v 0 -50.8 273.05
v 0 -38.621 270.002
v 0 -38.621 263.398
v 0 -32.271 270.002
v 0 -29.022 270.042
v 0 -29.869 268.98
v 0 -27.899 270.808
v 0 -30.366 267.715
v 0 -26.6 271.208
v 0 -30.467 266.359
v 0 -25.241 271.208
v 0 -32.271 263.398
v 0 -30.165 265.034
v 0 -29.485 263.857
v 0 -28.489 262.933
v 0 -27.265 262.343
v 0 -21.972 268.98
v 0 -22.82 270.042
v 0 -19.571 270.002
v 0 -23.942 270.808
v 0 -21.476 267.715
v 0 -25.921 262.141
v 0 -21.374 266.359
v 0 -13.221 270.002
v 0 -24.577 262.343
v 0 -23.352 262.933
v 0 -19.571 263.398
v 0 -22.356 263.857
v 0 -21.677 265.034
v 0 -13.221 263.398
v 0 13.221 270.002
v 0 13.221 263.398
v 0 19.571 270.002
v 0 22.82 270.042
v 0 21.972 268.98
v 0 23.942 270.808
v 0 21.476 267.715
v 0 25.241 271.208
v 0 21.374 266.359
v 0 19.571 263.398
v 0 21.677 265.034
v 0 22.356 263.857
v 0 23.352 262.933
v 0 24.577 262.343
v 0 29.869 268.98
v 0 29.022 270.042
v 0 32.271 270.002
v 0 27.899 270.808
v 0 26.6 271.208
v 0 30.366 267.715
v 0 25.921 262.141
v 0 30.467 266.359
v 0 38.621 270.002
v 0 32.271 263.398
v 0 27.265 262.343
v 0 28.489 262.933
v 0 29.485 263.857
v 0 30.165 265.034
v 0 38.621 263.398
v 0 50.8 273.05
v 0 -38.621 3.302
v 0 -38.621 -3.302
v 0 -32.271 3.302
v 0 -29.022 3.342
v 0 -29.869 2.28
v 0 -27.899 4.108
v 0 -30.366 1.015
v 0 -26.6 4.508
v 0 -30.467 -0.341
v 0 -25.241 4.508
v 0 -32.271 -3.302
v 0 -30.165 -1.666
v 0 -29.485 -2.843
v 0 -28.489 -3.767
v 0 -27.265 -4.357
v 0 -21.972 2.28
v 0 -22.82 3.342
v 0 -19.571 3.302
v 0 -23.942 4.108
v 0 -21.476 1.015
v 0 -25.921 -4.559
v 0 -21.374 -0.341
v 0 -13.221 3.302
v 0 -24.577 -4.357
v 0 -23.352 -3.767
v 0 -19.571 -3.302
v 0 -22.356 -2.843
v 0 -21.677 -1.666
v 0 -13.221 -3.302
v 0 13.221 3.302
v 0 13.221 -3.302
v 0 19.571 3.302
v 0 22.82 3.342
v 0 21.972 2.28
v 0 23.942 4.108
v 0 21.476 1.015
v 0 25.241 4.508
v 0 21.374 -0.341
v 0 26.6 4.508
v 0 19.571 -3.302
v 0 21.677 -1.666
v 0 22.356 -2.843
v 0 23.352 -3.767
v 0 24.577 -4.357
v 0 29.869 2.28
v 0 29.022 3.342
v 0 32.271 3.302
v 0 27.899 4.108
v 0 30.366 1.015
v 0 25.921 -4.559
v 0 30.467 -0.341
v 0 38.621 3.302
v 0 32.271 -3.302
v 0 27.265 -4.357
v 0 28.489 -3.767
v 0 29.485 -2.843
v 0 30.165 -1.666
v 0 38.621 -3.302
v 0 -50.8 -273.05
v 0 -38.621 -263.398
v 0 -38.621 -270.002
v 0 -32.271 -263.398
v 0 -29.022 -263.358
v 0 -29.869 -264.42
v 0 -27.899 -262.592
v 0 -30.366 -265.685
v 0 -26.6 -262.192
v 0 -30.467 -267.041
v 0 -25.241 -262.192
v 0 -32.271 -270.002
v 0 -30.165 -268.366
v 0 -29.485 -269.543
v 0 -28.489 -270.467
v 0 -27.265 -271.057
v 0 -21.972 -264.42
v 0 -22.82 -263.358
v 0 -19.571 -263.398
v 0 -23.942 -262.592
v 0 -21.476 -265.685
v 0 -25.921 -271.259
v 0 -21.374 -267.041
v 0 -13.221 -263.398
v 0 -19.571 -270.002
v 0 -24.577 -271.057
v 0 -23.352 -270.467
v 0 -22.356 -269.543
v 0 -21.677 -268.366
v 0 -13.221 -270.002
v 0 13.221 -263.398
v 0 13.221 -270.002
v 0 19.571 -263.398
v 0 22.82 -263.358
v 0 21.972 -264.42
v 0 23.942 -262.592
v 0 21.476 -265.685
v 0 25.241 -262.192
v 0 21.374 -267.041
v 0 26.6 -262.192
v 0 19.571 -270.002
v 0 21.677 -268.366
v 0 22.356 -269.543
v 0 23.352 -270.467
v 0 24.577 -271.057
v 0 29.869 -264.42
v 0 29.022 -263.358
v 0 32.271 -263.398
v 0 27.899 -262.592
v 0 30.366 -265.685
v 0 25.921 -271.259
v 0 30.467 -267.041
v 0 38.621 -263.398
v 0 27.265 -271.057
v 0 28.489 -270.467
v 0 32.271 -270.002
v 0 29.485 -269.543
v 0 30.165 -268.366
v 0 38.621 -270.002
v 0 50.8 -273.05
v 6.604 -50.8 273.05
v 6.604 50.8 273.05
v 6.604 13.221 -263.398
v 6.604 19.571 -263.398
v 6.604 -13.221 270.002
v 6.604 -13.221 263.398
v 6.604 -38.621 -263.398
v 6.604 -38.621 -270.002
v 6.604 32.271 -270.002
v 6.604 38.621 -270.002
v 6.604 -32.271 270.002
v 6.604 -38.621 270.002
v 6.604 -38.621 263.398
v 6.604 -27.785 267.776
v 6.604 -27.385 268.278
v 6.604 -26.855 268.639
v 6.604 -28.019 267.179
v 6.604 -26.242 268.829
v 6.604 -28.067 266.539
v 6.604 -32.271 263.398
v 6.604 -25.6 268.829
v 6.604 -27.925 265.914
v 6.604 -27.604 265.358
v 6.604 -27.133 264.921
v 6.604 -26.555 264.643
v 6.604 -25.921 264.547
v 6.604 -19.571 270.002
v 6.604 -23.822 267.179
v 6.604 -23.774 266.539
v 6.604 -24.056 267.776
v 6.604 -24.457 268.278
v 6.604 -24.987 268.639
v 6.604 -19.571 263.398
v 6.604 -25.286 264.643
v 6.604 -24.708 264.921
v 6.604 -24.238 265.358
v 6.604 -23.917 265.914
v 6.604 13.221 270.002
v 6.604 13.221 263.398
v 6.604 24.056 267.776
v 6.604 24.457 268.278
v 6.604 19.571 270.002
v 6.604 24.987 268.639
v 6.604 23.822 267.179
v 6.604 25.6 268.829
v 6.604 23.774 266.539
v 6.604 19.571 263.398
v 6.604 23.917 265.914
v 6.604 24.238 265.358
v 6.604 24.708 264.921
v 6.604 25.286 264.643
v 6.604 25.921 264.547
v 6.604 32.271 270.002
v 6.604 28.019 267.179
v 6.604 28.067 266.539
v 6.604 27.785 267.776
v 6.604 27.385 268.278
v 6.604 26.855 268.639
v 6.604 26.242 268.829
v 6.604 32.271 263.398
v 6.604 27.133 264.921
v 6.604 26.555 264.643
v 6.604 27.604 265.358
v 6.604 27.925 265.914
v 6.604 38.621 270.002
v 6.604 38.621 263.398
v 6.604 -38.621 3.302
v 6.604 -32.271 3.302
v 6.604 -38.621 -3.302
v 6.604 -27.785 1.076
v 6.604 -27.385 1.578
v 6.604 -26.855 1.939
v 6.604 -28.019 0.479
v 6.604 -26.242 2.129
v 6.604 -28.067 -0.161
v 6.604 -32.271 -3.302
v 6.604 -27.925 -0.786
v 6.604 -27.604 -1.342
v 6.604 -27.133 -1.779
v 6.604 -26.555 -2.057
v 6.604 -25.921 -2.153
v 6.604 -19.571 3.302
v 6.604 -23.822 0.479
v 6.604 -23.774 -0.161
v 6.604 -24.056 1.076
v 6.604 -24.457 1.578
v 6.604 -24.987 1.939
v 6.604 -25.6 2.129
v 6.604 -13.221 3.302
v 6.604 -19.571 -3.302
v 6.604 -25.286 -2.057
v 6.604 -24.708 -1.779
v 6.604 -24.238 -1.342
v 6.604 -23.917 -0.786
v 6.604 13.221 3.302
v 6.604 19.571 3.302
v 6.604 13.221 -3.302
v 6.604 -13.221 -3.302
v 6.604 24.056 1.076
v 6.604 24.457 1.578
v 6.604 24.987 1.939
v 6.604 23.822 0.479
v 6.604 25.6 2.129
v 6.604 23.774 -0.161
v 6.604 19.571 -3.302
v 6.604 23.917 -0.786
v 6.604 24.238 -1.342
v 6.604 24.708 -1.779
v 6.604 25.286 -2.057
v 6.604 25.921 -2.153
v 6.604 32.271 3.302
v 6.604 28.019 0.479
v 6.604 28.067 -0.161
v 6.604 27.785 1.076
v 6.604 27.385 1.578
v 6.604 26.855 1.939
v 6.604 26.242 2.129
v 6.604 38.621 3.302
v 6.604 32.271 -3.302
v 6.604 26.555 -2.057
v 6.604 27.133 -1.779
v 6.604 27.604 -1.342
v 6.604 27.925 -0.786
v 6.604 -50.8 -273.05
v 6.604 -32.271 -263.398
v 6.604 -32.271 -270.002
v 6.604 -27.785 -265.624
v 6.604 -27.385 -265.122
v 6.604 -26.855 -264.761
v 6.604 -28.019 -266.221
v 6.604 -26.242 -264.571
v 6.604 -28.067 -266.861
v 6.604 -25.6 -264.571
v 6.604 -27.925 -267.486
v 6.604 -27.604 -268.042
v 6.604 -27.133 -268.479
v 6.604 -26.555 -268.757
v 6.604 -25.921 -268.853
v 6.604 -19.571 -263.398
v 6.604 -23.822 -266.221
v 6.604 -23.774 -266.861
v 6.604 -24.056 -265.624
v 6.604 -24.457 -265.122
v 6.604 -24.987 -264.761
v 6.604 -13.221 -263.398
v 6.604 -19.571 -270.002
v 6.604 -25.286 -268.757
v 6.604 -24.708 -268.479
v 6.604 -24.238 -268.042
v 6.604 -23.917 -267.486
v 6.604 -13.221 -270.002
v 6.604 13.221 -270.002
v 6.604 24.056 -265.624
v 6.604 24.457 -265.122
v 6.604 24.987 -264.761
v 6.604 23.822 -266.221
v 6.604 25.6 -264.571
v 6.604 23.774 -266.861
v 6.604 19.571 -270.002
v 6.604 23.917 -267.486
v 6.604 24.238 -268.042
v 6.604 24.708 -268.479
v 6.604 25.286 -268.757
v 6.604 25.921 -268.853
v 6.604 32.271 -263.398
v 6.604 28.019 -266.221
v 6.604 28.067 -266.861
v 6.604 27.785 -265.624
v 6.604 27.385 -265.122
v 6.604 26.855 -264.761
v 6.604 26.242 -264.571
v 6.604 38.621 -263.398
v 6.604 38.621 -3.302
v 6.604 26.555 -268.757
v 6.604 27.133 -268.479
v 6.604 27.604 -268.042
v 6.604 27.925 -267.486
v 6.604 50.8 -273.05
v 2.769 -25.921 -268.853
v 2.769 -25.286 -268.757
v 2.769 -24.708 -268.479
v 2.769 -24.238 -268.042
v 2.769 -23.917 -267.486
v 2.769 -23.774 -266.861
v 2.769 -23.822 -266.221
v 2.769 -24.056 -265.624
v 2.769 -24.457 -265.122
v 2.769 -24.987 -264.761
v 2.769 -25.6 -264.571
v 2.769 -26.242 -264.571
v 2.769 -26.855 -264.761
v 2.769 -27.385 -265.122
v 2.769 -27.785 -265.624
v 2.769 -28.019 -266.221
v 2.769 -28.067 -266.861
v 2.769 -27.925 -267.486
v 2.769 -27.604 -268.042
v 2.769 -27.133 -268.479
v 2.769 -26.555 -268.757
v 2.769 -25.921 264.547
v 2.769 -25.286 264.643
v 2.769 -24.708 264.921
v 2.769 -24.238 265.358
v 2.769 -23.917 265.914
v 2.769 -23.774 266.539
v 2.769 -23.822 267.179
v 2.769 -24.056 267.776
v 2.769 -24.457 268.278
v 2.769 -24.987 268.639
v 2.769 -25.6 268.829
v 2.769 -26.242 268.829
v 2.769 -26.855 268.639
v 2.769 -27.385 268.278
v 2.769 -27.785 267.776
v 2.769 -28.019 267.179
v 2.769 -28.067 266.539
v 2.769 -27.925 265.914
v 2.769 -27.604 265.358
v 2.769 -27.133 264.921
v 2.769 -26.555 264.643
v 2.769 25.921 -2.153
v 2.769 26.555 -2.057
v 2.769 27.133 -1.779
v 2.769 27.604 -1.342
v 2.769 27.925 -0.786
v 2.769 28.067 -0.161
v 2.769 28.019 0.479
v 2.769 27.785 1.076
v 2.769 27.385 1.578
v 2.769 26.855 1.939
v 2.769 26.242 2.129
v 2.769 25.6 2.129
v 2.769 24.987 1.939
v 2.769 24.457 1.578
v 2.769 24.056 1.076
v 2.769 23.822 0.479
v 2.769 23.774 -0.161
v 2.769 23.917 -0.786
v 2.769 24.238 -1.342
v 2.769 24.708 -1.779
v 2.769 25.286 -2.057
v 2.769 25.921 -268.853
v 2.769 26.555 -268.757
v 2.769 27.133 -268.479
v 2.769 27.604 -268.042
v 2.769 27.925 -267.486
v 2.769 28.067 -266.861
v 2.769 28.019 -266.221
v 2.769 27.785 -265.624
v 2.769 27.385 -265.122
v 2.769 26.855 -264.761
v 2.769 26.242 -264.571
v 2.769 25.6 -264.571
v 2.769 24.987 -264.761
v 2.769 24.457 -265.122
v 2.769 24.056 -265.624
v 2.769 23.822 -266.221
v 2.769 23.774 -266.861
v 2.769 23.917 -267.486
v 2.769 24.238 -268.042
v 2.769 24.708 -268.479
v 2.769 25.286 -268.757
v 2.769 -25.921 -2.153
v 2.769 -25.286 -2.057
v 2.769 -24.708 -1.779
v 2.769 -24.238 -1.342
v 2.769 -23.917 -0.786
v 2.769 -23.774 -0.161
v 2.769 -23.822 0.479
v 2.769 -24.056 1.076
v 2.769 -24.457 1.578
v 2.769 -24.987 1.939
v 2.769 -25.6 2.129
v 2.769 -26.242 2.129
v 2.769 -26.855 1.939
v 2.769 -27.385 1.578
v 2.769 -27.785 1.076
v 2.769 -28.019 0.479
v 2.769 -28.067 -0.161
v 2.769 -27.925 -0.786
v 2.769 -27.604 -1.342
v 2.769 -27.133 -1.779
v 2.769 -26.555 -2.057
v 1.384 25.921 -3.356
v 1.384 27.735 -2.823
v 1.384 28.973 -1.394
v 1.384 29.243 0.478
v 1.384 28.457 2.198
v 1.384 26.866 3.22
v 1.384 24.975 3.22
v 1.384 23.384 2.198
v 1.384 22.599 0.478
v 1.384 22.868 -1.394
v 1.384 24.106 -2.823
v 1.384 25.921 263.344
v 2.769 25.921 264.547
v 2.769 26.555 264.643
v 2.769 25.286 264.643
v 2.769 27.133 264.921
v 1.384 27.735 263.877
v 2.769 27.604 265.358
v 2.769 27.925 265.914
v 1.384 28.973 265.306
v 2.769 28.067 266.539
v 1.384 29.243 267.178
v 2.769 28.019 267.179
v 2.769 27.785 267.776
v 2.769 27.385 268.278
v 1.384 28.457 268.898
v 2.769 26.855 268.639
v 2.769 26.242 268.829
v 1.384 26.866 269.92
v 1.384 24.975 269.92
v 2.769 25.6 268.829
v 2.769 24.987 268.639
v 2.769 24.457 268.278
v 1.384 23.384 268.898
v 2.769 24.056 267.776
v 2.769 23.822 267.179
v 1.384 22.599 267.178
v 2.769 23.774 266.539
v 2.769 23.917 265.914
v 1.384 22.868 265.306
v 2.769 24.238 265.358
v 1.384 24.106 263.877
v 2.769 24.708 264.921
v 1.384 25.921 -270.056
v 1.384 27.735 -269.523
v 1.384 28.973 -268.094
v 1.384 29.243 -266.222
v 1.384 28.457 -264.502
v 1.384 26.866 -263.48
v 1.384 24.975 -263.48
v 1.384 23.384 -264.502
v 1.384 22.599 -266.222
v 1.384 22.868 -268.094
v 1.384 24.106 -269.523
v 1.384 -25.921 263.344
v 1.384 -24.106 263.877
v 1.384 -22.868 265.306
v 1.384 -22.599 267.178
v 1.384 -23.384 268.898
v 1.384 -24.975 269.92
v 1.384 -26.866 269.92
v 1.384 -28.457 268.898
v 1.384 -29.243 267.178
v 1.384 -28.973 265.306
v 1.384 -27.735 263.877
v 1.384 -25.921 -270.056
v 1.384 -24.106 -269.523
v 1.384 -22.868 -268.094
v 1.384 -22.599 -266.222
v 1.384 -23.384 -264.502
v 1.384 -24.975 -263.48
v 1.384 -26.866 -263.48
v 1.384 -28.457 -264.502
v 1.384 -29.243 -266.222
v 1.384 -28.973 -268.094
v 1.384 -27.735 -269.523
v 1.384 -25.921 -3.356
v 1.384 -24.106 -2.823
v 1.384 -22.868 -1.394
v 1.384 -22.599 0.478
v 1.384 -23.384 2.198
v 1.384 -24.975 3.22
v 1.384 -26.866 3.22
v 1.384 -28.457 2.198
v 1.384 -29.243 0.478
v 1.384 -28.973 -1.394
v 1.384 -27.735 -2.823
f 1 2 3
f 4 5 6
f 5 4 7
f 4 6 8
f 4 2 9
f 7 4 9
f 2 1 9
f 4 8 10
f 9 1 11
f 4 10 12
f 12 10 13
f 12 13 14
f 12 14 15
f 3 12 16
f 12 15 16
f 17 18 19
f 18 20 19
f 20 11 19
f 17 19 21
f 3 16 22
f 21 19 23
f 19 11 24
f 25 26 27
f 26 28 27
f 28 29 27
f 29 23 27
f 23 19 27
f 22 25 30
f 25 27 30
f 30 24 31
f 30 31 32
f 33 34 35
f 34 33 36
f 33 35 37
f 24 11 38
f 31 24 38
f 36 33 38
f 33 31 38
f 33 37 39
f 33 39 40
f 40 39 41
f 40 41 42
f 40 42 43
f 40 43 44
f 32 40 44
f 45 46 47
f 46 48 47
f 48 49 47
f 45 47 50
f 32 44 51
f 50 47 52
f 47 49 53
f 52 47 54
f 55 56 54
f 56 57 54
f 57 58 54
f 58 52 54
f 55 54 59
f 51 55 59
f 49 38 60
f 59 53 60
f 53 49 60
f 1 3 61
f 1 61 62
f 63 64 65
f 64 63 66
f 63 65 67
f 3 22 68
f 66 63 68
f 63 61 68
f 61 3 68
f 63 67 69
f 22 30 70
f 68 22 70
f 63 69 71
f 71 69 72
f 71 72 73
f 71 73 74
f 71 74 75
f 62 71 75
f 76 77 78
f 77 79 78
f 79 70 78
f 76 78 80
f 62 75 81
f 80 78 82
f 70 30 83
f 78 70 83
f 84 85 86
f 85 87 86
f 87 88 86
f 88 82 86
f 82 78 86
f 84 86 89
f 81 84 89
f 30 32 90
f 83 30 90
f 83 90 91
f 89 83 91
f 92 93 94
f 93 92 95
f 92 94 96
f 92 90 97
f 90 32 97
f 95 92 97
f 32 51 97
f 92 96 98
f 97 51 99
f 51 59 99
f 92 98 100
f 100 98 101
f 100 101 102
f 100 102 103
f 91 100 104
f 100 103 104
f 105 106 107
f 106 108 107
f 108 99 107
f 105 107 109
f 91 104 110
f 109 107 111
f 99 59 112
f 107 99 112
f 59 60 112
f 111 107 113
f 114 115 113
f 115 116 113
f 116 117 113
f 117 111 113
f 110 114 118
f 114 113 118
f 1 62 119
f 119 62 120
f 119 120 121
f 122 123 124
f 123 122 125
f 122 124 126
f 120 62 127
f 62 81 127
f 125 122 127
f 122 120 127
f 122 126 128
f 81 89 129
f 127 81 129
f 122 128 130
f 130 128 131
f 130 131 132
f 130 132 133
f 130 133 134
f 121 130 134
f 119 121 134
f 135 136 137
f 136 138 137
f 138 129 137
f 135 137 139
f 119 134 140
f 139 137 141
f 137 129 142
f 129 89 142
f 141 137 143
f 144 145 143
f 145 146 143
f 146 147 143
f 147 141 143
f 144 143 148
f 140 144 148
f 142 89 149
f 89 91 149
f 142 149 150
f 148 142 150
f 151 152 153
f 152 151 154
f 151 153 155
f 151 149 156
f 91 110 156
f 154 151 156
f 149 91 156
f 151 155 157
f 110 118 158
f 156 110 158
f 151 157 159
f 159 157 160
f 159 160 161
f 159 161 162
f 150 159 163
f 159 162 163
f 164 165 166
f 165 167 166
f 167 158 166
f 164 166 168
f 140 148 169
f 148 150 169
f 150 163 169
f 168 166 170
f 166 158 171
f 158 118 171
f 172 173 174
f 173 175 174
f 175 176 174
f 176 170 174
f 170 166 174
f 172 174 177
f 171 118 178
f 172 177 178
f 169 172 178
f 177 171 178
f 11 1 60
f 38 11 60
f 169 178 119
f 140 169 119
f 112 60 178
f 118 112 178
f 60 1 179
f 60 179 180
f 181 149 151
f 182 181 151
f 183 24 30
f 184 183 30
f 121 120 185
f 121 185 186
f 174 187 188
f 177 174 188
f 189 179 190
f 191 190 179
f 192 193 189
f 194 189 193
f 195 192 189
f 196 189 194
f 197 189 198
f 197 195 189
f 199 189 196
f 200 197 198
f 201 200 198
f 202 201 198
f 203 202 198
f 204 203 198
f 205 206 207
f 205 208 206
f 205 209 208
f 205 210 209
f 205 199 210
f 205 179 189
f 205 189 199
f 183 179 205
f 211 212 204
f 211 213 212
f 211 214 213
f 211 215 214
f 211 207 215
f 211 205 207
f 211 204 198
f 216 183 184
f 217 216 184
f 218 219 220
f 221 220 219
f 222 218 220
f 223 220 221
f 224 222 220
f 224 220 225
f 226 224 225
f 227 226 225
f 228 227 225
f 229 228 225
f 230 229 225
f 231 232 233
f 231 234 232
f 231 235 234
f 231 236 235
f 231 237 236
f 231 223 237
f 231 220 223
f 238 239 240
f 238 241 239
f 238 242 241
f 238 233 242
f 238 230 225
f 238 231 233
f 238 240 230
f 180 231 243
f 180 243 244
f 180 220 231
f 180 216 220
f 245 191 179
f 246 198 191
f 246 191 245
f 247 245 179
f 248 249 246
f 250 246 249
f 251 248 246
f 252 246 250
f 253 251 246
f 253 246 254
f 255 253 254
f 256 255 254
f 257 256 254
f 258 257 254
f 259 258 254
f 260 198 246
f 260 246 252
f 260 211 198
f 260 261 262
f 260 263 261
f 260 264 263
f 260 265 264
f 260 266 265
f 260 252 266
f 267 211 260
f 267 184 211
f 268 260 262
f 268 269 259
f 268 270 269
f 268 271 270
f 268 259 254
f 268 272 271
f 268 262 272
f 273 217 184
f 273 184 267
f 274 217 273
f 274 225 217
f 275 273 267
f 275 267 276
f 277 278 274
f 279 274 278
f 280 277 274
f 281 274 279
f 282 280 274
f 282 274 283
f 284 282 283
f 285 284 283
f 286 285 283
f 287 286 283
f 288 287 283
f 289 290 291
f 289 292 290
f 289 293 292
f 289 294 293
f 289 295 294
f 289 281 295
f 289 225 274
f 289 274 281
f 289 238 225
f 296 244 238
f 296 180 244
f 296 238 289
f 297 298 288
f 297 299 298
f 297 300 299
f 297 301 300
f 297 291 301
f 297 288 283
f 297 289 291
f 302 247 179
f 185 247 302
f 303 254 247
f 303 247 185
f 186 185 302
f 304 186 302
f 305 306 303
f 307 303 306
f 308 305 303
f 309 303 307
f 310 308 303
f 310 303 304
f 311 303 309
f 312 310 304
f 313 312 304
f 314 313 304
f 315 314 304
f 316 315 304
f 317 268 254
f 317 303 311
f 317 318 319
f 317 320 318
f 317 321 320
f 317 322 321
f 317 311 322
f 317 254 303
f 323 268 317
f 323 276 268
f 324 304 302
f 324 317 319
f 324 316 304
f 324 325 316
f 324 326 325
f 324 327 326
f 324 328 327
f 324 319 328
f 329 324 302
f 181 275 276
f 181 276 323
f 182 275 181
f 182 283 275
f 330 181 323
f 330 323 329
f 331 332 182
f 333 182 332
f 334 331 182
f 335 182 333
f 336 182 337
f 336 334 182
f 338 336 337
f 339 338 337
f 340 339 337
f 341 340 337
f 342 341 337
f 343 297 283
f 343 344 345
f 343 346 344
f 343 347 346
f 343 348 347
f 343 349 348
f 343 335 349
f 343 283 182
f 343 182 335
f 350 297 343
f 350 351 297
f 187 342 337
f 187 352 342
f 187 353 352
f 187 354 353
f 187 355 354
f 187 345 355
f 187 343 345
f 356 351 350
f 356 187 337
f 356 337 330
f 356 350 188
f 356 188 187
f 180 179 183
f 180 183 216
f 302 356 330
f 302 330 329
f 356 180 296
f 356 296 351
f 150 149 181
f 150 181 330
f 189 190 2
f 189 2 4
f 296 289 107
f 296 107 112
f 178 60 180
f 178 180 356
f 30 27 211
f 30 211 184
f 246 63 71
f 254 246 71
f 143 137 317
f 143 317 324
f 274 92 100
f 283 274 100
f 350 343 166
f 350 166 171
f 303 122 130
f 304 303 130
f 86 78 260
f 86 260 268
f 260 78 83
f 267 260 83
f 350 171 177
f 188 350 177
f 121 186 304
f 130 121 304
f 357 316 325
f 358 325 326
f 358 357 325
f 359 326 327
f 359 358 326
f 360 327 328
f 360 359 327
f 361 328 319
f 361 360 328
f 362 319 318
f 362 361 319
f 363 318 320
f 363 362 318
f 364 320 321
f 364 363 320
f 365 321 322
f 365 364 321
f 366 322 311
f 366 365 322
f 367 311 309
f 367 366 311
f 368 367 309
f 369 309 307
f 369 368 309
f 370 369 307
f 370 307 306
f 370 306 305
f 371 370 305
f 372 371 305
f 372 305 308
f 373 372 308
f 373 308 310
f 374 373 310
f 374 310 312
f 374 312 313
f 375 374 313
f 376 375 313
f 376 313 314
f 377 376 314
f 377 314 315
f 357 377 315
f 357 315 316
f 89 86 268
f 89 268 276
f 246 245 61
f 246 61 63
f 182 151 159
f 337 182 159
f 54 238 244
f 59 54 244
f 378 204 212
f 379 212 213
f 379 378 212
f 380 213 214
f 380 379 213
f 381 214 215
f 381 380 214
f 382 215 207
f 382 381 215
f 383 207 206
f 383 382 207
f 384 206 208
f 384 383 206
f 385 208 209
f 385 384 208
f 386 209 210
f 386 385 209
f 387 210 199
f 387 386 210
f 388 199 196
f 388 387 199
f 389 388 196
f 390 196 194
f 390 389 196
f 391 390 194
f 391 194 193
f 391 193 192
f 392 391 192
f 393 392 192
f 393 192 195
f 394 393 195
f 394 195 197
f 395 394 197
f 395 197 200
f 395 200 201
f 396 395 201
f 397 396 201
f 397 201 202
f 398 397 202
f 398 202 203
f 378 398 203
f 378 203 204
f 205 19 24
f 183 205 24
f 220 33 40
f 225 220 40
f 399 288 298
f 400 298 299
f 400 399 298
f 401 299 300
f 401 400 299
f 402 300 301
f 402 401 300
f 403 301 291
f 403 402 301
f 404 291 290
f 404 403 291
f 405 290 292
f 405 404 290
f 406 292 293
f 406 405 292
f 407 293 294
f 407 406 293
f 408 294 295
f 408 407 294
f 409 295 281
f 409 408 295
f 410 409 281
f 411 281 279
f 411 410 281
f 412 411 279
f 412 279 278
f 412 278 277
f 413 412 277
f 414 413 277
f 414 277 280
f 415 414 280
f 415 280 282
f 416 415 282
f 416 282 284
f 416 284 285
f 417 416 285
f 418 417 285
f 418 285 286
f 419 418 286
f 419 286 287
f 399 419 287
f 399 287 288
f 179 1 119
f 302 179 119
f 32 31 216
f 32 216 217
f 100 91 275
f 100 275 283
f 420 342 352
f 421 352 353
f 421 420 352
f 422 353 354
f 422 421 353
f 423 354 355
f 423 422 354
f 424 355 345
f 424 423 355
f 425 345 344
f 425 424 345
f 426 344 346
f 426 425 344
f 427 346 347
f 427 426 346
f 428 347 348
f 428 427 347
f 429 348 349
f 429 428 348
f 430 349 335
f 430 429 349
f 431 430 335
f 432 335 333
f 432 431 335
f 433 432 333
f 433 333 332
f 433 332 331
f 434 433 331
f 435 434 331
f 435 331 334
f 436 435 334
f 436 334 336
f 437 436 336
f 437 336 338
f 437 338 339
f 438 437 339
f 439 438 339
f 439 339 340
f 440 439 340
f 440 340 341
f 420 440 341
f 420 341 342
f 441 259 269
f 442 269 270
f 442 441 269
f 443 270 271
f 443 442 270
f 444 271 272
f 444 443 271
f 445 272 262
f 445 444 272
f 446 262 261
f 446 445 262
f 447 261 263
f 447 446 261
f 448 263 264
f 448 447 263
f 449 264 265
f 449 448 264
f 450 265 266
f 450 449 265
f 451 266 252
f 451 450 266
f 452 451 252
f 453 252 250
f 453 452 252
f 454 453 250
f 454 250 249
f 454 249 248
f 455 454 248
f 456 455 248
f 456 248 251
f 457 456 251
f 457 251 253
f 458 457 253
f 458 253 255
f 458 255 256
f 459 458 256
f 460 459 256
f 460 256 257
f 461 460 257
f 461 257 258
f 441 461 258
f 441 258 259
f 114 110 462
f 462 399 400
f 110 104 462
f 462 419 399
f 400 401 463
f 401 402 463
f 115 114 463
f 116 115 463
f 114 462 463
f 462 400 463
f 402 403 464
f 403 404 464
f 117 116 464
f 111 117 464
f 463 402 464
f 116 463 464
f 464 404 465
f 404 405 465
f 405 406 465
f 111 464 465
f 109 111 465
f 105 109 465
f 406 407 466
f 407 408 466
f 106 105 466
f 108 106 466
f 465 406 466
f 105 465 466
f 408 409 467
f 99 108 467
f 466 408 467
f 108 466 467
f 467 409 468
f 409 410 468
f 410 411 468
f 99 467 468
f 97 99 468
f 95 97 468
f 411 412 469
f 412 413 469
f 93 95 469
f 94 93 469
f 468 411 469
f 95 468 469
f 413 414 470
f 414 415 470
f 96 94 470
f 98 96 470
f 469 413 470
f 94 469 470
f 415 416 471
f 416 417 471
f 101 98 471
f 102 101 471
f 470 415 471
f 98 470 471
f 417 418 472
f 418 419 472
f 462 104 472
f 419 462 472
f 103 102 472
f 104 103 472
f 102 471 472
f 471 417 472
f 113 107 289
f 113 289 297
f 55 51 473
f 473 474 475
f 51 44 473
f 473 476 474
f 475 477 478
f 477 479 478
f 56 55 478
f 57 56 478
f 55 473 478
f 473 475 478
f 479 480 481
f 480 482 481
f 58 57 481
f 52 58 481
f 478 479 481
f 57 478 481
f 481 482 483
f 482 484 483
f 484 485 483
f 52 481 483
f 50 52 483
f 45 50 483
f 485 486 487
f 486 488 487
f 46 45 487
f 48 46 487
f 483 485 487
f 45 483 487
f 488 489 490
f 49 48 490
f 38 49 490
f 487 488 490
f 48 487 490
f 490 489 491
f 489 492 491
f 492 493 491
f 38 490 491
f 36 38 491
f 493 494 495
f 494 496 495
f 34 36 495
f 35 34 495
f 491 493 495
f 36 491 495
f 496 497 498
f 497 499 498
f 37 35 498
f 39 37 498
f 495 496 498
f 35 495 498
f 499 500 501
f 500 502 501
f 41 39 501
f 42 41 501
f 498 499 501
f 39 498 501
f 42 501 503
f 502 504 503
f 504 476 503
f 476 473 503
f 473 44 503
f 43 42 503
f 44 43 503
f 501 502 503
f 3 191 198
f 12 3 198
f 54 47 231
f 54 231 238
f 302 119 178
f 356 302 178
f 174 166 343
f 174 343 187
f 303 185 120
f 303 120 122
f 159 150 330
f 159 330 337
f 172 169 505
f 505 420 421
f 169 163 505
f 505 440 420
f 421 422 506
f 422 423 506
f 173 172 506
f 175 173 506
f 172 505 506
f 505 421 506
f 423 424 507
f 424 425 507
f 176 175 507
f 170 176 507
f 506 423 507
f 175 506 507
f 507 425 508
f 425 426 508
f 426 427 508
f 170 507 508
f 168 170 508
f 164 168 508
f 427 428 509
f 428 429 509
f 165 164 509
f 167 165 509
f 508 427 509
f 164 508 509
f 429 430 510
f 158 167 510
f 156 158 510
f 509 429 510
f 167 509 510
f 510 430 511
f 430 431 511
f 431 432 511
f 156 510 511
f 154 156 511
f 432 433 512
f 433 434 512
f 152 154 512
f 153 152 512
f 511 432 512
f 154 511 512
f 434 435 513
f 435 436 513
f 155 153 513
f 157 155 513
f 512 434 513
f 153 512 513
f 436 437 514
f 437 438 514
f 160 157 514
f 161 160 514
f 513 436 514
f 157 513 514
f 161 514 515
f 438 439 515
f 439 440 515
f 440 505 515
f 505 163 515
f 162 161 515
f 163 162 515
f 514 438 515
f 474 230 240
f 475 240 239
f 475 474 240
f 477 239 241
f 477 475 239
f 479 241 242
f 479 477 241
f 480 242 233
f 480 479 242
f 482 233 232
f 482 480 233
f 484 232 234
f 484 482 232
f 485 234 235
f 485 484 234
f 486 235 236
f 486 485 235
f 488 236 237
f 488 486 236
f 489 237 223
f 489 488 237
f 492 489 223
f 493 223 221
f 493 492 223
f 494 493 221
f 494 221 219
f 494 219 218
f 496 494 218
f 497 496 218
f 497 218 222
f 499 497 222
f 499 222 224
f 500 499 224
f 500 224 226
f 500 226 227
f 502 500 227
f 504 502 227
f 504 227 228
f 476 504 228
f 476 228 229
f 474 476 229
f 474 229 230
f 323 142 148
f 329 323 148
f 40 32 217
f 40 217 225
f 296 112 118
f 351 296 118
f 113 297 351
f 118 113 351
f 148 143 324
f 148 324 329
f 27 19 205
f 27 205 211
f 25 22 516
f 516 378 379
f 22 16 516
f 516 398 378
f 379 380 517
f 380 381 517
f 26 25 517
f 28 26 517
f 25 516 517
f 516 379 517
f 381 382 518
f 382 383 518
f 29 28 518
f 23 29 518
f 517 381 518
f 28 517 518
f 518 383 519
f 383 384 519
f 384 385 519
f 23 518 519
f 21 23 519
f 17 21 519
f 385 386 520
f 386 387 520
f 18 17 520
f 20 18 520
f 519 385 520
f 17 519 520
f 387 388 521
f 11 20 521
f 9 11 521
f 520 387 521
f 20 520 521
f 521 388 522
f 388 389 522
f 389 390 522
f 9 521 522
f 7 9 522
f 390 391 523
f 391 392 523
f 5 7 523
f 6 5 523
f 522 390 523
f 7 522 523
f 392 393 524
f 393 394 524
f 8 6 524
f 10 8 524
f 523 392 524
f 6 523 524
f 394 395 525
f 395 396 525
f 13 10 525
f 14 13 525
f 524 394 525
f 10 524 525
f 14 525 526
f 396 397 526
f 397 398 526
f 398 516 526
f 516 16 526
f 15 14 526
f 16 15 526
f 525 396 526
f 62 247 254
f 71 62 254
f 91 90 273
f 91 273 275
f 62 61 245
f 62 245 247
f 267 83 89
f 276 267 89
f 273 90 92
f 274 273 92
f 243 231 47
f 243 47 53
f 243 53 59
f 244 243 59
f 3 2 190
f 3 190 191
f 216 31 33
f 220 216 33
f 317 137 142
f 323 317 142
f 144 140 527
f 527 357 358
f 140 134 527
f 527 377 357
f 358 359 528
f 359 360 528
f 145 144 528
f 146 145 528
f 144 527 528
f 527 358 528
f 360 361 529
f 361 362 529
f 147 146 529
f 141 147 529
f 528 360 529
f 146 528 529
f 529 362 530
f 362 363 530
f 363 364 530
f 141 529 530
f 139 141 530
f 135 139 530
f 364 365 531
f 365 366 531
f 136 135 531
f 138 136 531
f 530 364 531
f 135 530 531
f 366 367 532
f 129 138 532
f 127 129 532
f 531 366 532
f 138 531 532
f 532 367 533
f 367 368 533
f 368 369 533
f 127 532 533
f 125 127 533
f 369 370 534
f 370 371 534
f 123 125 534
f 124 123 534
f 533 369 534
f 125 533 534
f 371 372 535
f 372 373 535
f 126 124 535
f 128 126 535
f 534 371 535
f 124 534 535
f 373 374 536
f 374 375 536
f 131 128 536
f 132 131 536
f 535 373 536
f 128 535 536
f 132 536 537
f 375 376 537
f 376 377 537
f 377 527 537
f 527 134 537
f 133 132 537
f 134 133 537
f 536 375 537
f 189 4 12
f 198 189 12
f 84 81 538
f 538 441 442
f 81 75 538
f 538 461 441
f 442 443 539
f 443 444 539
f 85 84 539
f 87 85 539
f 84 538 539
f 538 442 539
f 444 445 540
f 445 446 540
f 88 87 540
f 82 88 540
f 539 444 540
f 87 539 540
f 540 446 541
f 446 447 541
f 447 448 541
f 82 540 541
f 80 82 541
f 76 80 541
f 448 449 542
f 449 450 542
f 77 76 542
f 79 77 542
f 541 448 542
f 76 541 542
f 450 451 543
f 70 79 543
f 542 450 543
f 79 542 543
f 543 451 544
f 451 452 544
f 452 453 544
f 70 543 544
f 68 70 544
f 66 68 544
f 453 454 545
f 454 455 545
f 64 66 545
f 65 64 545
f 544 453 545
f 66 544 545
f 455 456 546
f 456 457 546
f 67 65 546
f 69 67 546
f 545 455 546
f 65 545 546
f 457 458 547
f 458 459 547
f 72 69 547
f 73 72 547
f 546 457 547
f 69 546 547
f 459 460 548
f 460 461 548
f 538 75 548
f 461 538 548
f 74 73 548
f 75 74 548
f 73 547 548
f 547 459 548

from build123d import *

# Parameters (mm, degrees)
SKETCH1_W                                         = 546.1
SKETCH1_H                                         = 101.6
SKETCH1_R                                         = 2.15265
SKETCH1_W_2                                       = 6.604
SKETCH1_H_2                                       = 6.35
BOSS_EXTRUDE1_DEPTH                               = 6.604
CSK_FOR_8_FLAT_HEAD_SOCKET_CAP_SCREW2_D           = 4.3053
CSK_FOR_8_FLAT_HEAD_SOCKET_CAP_SCREW2_CSINK_D     = 9.1186
CSK_FOR_8_FLAT_HEAD_SOCKET_CAP_SCREW2_CSINK_ANGLE = 82


with BuildPart() as part:
    # Sketch1 → Boss-Extrude1 (new body)
    with BuildSketch(Plane(origin=(0, 0, 0), x_dir=(0, 0, -1), z_dir=(1, 0, 0))):
        Rectangle(SKETCH1_W, SKETCH1_H)
        with Locations((-266.7, 25.9207)):
            Circle(SKETCH1_R, mode=Mode.SUBTRACT)
        with Locations((-266.7, -25.9207)):
            Circle(SKETCH1_R, mode=Mode.SUBTRACT)
        with Locations((0, -25.9207)):
            Circle(SKETCH1_R, mode=Mode.SUBTRACT)
        with Locations((0, 25.9207)):
            Circle(SKETCH1_R, mode=Mode.SUBTRACT)
        with Locations((266.7, -25.9207)):
            Circle(SKETCH1_R, mode=Mode.SUBTRACT)
        with Locations((266.7, 25.9207)):
            Circle(SKETCH1_R, mode=Mode.SUBTRACT)
        with Locations((-266.7, 16.3957)):
            Rectangle(SKETCH1_W_2, SKETCH1_H_2, mode=Mode.SUBTRACT)
        with Locations((-266.7, 35.4457)):
            Rectangle(SKETCH1_W_2, SKETCH1_H_2, mode=Mode.SUBTRACT)
        with Locations((-266.7, -35.4457)):
            Rectangle(SKETCH1_W_2, SKETCH1_H_2, mode=Mode.SUBTRACT)
        with Locations((-266.7, -16.3957)):
            Rectangle(SKETCH1_W_2, SKETCH1_H_2, mode=Mode.SUBTRACT)
        with Locations((0, -16.3957)):
            Rectangle(SKETCH1_W_2, SKETCH1_H_2, mode=Mode.SUBTRACT)
        with Locations((0, -35.4457)):
            Rectangle(SKETCH1_W_2, SKETCH1_H_2, mode=Mode.SUBTRACT)
        with Locations((0, 35.4457)):
            Rectangle(SKETCH1_W_2, SKETCH1_H_2, mode=Mode.SUBTRACT)
        with Locations((0, 16.3957)):
            Rectangle(SKETCH1_W_2, SKETCH1_H_2, mode=Mode.SUBTRACT)
        with Locations((266.7, -16.3957)):
            Rectangle(SKETCH1_W_2, SKETCH1_H_2, mode=Mode.SUBTRACT)
        with Locations((266.7, -35.4457)):
            Rectangle(SKETCH1_W_2, SKETCH1_H_2, mode=Mode.SUBTRACT)
        with Locations((266.7, 35.4457)):
            Rectangle(SKETCH1_W_2, SKETCH1_H_2, mode=Mode.SUBTRACT)
        with Locations((266.7, 16.3957)):
            Rectangle(SKETCH1_W_2, SKETCH1_H_2, mode=Mode.SUBTRACT)
    extrude(amount=BOSS_EXTRUDE1_DEPTH)

    # CSK for #8 Flat Head Socket Cap Screw2 (through all)
    with Locations(Plane.ZY):
        with Locations((-266.7, 25.9207), (-266.7, -25.9207), (266.7, -25.9207), (266.7, 25.9207), (0, 25.9207), (0, -25.9207)):
            CounterSinkHole(CSK_FOR_8_FLAT_HEAD_SOCKET_CAP_SCREW2_D / 2, CSK_FOR_8_FLAT_HEAD_SOCKET_CAP_SCREW2_CSINK_D / 2, counter_sink_angle=CSK_FOR_8_FLAT_HEAD_SOCKET_CAP_SCREW2_CSINK_ANGLE)


solid = part.part
